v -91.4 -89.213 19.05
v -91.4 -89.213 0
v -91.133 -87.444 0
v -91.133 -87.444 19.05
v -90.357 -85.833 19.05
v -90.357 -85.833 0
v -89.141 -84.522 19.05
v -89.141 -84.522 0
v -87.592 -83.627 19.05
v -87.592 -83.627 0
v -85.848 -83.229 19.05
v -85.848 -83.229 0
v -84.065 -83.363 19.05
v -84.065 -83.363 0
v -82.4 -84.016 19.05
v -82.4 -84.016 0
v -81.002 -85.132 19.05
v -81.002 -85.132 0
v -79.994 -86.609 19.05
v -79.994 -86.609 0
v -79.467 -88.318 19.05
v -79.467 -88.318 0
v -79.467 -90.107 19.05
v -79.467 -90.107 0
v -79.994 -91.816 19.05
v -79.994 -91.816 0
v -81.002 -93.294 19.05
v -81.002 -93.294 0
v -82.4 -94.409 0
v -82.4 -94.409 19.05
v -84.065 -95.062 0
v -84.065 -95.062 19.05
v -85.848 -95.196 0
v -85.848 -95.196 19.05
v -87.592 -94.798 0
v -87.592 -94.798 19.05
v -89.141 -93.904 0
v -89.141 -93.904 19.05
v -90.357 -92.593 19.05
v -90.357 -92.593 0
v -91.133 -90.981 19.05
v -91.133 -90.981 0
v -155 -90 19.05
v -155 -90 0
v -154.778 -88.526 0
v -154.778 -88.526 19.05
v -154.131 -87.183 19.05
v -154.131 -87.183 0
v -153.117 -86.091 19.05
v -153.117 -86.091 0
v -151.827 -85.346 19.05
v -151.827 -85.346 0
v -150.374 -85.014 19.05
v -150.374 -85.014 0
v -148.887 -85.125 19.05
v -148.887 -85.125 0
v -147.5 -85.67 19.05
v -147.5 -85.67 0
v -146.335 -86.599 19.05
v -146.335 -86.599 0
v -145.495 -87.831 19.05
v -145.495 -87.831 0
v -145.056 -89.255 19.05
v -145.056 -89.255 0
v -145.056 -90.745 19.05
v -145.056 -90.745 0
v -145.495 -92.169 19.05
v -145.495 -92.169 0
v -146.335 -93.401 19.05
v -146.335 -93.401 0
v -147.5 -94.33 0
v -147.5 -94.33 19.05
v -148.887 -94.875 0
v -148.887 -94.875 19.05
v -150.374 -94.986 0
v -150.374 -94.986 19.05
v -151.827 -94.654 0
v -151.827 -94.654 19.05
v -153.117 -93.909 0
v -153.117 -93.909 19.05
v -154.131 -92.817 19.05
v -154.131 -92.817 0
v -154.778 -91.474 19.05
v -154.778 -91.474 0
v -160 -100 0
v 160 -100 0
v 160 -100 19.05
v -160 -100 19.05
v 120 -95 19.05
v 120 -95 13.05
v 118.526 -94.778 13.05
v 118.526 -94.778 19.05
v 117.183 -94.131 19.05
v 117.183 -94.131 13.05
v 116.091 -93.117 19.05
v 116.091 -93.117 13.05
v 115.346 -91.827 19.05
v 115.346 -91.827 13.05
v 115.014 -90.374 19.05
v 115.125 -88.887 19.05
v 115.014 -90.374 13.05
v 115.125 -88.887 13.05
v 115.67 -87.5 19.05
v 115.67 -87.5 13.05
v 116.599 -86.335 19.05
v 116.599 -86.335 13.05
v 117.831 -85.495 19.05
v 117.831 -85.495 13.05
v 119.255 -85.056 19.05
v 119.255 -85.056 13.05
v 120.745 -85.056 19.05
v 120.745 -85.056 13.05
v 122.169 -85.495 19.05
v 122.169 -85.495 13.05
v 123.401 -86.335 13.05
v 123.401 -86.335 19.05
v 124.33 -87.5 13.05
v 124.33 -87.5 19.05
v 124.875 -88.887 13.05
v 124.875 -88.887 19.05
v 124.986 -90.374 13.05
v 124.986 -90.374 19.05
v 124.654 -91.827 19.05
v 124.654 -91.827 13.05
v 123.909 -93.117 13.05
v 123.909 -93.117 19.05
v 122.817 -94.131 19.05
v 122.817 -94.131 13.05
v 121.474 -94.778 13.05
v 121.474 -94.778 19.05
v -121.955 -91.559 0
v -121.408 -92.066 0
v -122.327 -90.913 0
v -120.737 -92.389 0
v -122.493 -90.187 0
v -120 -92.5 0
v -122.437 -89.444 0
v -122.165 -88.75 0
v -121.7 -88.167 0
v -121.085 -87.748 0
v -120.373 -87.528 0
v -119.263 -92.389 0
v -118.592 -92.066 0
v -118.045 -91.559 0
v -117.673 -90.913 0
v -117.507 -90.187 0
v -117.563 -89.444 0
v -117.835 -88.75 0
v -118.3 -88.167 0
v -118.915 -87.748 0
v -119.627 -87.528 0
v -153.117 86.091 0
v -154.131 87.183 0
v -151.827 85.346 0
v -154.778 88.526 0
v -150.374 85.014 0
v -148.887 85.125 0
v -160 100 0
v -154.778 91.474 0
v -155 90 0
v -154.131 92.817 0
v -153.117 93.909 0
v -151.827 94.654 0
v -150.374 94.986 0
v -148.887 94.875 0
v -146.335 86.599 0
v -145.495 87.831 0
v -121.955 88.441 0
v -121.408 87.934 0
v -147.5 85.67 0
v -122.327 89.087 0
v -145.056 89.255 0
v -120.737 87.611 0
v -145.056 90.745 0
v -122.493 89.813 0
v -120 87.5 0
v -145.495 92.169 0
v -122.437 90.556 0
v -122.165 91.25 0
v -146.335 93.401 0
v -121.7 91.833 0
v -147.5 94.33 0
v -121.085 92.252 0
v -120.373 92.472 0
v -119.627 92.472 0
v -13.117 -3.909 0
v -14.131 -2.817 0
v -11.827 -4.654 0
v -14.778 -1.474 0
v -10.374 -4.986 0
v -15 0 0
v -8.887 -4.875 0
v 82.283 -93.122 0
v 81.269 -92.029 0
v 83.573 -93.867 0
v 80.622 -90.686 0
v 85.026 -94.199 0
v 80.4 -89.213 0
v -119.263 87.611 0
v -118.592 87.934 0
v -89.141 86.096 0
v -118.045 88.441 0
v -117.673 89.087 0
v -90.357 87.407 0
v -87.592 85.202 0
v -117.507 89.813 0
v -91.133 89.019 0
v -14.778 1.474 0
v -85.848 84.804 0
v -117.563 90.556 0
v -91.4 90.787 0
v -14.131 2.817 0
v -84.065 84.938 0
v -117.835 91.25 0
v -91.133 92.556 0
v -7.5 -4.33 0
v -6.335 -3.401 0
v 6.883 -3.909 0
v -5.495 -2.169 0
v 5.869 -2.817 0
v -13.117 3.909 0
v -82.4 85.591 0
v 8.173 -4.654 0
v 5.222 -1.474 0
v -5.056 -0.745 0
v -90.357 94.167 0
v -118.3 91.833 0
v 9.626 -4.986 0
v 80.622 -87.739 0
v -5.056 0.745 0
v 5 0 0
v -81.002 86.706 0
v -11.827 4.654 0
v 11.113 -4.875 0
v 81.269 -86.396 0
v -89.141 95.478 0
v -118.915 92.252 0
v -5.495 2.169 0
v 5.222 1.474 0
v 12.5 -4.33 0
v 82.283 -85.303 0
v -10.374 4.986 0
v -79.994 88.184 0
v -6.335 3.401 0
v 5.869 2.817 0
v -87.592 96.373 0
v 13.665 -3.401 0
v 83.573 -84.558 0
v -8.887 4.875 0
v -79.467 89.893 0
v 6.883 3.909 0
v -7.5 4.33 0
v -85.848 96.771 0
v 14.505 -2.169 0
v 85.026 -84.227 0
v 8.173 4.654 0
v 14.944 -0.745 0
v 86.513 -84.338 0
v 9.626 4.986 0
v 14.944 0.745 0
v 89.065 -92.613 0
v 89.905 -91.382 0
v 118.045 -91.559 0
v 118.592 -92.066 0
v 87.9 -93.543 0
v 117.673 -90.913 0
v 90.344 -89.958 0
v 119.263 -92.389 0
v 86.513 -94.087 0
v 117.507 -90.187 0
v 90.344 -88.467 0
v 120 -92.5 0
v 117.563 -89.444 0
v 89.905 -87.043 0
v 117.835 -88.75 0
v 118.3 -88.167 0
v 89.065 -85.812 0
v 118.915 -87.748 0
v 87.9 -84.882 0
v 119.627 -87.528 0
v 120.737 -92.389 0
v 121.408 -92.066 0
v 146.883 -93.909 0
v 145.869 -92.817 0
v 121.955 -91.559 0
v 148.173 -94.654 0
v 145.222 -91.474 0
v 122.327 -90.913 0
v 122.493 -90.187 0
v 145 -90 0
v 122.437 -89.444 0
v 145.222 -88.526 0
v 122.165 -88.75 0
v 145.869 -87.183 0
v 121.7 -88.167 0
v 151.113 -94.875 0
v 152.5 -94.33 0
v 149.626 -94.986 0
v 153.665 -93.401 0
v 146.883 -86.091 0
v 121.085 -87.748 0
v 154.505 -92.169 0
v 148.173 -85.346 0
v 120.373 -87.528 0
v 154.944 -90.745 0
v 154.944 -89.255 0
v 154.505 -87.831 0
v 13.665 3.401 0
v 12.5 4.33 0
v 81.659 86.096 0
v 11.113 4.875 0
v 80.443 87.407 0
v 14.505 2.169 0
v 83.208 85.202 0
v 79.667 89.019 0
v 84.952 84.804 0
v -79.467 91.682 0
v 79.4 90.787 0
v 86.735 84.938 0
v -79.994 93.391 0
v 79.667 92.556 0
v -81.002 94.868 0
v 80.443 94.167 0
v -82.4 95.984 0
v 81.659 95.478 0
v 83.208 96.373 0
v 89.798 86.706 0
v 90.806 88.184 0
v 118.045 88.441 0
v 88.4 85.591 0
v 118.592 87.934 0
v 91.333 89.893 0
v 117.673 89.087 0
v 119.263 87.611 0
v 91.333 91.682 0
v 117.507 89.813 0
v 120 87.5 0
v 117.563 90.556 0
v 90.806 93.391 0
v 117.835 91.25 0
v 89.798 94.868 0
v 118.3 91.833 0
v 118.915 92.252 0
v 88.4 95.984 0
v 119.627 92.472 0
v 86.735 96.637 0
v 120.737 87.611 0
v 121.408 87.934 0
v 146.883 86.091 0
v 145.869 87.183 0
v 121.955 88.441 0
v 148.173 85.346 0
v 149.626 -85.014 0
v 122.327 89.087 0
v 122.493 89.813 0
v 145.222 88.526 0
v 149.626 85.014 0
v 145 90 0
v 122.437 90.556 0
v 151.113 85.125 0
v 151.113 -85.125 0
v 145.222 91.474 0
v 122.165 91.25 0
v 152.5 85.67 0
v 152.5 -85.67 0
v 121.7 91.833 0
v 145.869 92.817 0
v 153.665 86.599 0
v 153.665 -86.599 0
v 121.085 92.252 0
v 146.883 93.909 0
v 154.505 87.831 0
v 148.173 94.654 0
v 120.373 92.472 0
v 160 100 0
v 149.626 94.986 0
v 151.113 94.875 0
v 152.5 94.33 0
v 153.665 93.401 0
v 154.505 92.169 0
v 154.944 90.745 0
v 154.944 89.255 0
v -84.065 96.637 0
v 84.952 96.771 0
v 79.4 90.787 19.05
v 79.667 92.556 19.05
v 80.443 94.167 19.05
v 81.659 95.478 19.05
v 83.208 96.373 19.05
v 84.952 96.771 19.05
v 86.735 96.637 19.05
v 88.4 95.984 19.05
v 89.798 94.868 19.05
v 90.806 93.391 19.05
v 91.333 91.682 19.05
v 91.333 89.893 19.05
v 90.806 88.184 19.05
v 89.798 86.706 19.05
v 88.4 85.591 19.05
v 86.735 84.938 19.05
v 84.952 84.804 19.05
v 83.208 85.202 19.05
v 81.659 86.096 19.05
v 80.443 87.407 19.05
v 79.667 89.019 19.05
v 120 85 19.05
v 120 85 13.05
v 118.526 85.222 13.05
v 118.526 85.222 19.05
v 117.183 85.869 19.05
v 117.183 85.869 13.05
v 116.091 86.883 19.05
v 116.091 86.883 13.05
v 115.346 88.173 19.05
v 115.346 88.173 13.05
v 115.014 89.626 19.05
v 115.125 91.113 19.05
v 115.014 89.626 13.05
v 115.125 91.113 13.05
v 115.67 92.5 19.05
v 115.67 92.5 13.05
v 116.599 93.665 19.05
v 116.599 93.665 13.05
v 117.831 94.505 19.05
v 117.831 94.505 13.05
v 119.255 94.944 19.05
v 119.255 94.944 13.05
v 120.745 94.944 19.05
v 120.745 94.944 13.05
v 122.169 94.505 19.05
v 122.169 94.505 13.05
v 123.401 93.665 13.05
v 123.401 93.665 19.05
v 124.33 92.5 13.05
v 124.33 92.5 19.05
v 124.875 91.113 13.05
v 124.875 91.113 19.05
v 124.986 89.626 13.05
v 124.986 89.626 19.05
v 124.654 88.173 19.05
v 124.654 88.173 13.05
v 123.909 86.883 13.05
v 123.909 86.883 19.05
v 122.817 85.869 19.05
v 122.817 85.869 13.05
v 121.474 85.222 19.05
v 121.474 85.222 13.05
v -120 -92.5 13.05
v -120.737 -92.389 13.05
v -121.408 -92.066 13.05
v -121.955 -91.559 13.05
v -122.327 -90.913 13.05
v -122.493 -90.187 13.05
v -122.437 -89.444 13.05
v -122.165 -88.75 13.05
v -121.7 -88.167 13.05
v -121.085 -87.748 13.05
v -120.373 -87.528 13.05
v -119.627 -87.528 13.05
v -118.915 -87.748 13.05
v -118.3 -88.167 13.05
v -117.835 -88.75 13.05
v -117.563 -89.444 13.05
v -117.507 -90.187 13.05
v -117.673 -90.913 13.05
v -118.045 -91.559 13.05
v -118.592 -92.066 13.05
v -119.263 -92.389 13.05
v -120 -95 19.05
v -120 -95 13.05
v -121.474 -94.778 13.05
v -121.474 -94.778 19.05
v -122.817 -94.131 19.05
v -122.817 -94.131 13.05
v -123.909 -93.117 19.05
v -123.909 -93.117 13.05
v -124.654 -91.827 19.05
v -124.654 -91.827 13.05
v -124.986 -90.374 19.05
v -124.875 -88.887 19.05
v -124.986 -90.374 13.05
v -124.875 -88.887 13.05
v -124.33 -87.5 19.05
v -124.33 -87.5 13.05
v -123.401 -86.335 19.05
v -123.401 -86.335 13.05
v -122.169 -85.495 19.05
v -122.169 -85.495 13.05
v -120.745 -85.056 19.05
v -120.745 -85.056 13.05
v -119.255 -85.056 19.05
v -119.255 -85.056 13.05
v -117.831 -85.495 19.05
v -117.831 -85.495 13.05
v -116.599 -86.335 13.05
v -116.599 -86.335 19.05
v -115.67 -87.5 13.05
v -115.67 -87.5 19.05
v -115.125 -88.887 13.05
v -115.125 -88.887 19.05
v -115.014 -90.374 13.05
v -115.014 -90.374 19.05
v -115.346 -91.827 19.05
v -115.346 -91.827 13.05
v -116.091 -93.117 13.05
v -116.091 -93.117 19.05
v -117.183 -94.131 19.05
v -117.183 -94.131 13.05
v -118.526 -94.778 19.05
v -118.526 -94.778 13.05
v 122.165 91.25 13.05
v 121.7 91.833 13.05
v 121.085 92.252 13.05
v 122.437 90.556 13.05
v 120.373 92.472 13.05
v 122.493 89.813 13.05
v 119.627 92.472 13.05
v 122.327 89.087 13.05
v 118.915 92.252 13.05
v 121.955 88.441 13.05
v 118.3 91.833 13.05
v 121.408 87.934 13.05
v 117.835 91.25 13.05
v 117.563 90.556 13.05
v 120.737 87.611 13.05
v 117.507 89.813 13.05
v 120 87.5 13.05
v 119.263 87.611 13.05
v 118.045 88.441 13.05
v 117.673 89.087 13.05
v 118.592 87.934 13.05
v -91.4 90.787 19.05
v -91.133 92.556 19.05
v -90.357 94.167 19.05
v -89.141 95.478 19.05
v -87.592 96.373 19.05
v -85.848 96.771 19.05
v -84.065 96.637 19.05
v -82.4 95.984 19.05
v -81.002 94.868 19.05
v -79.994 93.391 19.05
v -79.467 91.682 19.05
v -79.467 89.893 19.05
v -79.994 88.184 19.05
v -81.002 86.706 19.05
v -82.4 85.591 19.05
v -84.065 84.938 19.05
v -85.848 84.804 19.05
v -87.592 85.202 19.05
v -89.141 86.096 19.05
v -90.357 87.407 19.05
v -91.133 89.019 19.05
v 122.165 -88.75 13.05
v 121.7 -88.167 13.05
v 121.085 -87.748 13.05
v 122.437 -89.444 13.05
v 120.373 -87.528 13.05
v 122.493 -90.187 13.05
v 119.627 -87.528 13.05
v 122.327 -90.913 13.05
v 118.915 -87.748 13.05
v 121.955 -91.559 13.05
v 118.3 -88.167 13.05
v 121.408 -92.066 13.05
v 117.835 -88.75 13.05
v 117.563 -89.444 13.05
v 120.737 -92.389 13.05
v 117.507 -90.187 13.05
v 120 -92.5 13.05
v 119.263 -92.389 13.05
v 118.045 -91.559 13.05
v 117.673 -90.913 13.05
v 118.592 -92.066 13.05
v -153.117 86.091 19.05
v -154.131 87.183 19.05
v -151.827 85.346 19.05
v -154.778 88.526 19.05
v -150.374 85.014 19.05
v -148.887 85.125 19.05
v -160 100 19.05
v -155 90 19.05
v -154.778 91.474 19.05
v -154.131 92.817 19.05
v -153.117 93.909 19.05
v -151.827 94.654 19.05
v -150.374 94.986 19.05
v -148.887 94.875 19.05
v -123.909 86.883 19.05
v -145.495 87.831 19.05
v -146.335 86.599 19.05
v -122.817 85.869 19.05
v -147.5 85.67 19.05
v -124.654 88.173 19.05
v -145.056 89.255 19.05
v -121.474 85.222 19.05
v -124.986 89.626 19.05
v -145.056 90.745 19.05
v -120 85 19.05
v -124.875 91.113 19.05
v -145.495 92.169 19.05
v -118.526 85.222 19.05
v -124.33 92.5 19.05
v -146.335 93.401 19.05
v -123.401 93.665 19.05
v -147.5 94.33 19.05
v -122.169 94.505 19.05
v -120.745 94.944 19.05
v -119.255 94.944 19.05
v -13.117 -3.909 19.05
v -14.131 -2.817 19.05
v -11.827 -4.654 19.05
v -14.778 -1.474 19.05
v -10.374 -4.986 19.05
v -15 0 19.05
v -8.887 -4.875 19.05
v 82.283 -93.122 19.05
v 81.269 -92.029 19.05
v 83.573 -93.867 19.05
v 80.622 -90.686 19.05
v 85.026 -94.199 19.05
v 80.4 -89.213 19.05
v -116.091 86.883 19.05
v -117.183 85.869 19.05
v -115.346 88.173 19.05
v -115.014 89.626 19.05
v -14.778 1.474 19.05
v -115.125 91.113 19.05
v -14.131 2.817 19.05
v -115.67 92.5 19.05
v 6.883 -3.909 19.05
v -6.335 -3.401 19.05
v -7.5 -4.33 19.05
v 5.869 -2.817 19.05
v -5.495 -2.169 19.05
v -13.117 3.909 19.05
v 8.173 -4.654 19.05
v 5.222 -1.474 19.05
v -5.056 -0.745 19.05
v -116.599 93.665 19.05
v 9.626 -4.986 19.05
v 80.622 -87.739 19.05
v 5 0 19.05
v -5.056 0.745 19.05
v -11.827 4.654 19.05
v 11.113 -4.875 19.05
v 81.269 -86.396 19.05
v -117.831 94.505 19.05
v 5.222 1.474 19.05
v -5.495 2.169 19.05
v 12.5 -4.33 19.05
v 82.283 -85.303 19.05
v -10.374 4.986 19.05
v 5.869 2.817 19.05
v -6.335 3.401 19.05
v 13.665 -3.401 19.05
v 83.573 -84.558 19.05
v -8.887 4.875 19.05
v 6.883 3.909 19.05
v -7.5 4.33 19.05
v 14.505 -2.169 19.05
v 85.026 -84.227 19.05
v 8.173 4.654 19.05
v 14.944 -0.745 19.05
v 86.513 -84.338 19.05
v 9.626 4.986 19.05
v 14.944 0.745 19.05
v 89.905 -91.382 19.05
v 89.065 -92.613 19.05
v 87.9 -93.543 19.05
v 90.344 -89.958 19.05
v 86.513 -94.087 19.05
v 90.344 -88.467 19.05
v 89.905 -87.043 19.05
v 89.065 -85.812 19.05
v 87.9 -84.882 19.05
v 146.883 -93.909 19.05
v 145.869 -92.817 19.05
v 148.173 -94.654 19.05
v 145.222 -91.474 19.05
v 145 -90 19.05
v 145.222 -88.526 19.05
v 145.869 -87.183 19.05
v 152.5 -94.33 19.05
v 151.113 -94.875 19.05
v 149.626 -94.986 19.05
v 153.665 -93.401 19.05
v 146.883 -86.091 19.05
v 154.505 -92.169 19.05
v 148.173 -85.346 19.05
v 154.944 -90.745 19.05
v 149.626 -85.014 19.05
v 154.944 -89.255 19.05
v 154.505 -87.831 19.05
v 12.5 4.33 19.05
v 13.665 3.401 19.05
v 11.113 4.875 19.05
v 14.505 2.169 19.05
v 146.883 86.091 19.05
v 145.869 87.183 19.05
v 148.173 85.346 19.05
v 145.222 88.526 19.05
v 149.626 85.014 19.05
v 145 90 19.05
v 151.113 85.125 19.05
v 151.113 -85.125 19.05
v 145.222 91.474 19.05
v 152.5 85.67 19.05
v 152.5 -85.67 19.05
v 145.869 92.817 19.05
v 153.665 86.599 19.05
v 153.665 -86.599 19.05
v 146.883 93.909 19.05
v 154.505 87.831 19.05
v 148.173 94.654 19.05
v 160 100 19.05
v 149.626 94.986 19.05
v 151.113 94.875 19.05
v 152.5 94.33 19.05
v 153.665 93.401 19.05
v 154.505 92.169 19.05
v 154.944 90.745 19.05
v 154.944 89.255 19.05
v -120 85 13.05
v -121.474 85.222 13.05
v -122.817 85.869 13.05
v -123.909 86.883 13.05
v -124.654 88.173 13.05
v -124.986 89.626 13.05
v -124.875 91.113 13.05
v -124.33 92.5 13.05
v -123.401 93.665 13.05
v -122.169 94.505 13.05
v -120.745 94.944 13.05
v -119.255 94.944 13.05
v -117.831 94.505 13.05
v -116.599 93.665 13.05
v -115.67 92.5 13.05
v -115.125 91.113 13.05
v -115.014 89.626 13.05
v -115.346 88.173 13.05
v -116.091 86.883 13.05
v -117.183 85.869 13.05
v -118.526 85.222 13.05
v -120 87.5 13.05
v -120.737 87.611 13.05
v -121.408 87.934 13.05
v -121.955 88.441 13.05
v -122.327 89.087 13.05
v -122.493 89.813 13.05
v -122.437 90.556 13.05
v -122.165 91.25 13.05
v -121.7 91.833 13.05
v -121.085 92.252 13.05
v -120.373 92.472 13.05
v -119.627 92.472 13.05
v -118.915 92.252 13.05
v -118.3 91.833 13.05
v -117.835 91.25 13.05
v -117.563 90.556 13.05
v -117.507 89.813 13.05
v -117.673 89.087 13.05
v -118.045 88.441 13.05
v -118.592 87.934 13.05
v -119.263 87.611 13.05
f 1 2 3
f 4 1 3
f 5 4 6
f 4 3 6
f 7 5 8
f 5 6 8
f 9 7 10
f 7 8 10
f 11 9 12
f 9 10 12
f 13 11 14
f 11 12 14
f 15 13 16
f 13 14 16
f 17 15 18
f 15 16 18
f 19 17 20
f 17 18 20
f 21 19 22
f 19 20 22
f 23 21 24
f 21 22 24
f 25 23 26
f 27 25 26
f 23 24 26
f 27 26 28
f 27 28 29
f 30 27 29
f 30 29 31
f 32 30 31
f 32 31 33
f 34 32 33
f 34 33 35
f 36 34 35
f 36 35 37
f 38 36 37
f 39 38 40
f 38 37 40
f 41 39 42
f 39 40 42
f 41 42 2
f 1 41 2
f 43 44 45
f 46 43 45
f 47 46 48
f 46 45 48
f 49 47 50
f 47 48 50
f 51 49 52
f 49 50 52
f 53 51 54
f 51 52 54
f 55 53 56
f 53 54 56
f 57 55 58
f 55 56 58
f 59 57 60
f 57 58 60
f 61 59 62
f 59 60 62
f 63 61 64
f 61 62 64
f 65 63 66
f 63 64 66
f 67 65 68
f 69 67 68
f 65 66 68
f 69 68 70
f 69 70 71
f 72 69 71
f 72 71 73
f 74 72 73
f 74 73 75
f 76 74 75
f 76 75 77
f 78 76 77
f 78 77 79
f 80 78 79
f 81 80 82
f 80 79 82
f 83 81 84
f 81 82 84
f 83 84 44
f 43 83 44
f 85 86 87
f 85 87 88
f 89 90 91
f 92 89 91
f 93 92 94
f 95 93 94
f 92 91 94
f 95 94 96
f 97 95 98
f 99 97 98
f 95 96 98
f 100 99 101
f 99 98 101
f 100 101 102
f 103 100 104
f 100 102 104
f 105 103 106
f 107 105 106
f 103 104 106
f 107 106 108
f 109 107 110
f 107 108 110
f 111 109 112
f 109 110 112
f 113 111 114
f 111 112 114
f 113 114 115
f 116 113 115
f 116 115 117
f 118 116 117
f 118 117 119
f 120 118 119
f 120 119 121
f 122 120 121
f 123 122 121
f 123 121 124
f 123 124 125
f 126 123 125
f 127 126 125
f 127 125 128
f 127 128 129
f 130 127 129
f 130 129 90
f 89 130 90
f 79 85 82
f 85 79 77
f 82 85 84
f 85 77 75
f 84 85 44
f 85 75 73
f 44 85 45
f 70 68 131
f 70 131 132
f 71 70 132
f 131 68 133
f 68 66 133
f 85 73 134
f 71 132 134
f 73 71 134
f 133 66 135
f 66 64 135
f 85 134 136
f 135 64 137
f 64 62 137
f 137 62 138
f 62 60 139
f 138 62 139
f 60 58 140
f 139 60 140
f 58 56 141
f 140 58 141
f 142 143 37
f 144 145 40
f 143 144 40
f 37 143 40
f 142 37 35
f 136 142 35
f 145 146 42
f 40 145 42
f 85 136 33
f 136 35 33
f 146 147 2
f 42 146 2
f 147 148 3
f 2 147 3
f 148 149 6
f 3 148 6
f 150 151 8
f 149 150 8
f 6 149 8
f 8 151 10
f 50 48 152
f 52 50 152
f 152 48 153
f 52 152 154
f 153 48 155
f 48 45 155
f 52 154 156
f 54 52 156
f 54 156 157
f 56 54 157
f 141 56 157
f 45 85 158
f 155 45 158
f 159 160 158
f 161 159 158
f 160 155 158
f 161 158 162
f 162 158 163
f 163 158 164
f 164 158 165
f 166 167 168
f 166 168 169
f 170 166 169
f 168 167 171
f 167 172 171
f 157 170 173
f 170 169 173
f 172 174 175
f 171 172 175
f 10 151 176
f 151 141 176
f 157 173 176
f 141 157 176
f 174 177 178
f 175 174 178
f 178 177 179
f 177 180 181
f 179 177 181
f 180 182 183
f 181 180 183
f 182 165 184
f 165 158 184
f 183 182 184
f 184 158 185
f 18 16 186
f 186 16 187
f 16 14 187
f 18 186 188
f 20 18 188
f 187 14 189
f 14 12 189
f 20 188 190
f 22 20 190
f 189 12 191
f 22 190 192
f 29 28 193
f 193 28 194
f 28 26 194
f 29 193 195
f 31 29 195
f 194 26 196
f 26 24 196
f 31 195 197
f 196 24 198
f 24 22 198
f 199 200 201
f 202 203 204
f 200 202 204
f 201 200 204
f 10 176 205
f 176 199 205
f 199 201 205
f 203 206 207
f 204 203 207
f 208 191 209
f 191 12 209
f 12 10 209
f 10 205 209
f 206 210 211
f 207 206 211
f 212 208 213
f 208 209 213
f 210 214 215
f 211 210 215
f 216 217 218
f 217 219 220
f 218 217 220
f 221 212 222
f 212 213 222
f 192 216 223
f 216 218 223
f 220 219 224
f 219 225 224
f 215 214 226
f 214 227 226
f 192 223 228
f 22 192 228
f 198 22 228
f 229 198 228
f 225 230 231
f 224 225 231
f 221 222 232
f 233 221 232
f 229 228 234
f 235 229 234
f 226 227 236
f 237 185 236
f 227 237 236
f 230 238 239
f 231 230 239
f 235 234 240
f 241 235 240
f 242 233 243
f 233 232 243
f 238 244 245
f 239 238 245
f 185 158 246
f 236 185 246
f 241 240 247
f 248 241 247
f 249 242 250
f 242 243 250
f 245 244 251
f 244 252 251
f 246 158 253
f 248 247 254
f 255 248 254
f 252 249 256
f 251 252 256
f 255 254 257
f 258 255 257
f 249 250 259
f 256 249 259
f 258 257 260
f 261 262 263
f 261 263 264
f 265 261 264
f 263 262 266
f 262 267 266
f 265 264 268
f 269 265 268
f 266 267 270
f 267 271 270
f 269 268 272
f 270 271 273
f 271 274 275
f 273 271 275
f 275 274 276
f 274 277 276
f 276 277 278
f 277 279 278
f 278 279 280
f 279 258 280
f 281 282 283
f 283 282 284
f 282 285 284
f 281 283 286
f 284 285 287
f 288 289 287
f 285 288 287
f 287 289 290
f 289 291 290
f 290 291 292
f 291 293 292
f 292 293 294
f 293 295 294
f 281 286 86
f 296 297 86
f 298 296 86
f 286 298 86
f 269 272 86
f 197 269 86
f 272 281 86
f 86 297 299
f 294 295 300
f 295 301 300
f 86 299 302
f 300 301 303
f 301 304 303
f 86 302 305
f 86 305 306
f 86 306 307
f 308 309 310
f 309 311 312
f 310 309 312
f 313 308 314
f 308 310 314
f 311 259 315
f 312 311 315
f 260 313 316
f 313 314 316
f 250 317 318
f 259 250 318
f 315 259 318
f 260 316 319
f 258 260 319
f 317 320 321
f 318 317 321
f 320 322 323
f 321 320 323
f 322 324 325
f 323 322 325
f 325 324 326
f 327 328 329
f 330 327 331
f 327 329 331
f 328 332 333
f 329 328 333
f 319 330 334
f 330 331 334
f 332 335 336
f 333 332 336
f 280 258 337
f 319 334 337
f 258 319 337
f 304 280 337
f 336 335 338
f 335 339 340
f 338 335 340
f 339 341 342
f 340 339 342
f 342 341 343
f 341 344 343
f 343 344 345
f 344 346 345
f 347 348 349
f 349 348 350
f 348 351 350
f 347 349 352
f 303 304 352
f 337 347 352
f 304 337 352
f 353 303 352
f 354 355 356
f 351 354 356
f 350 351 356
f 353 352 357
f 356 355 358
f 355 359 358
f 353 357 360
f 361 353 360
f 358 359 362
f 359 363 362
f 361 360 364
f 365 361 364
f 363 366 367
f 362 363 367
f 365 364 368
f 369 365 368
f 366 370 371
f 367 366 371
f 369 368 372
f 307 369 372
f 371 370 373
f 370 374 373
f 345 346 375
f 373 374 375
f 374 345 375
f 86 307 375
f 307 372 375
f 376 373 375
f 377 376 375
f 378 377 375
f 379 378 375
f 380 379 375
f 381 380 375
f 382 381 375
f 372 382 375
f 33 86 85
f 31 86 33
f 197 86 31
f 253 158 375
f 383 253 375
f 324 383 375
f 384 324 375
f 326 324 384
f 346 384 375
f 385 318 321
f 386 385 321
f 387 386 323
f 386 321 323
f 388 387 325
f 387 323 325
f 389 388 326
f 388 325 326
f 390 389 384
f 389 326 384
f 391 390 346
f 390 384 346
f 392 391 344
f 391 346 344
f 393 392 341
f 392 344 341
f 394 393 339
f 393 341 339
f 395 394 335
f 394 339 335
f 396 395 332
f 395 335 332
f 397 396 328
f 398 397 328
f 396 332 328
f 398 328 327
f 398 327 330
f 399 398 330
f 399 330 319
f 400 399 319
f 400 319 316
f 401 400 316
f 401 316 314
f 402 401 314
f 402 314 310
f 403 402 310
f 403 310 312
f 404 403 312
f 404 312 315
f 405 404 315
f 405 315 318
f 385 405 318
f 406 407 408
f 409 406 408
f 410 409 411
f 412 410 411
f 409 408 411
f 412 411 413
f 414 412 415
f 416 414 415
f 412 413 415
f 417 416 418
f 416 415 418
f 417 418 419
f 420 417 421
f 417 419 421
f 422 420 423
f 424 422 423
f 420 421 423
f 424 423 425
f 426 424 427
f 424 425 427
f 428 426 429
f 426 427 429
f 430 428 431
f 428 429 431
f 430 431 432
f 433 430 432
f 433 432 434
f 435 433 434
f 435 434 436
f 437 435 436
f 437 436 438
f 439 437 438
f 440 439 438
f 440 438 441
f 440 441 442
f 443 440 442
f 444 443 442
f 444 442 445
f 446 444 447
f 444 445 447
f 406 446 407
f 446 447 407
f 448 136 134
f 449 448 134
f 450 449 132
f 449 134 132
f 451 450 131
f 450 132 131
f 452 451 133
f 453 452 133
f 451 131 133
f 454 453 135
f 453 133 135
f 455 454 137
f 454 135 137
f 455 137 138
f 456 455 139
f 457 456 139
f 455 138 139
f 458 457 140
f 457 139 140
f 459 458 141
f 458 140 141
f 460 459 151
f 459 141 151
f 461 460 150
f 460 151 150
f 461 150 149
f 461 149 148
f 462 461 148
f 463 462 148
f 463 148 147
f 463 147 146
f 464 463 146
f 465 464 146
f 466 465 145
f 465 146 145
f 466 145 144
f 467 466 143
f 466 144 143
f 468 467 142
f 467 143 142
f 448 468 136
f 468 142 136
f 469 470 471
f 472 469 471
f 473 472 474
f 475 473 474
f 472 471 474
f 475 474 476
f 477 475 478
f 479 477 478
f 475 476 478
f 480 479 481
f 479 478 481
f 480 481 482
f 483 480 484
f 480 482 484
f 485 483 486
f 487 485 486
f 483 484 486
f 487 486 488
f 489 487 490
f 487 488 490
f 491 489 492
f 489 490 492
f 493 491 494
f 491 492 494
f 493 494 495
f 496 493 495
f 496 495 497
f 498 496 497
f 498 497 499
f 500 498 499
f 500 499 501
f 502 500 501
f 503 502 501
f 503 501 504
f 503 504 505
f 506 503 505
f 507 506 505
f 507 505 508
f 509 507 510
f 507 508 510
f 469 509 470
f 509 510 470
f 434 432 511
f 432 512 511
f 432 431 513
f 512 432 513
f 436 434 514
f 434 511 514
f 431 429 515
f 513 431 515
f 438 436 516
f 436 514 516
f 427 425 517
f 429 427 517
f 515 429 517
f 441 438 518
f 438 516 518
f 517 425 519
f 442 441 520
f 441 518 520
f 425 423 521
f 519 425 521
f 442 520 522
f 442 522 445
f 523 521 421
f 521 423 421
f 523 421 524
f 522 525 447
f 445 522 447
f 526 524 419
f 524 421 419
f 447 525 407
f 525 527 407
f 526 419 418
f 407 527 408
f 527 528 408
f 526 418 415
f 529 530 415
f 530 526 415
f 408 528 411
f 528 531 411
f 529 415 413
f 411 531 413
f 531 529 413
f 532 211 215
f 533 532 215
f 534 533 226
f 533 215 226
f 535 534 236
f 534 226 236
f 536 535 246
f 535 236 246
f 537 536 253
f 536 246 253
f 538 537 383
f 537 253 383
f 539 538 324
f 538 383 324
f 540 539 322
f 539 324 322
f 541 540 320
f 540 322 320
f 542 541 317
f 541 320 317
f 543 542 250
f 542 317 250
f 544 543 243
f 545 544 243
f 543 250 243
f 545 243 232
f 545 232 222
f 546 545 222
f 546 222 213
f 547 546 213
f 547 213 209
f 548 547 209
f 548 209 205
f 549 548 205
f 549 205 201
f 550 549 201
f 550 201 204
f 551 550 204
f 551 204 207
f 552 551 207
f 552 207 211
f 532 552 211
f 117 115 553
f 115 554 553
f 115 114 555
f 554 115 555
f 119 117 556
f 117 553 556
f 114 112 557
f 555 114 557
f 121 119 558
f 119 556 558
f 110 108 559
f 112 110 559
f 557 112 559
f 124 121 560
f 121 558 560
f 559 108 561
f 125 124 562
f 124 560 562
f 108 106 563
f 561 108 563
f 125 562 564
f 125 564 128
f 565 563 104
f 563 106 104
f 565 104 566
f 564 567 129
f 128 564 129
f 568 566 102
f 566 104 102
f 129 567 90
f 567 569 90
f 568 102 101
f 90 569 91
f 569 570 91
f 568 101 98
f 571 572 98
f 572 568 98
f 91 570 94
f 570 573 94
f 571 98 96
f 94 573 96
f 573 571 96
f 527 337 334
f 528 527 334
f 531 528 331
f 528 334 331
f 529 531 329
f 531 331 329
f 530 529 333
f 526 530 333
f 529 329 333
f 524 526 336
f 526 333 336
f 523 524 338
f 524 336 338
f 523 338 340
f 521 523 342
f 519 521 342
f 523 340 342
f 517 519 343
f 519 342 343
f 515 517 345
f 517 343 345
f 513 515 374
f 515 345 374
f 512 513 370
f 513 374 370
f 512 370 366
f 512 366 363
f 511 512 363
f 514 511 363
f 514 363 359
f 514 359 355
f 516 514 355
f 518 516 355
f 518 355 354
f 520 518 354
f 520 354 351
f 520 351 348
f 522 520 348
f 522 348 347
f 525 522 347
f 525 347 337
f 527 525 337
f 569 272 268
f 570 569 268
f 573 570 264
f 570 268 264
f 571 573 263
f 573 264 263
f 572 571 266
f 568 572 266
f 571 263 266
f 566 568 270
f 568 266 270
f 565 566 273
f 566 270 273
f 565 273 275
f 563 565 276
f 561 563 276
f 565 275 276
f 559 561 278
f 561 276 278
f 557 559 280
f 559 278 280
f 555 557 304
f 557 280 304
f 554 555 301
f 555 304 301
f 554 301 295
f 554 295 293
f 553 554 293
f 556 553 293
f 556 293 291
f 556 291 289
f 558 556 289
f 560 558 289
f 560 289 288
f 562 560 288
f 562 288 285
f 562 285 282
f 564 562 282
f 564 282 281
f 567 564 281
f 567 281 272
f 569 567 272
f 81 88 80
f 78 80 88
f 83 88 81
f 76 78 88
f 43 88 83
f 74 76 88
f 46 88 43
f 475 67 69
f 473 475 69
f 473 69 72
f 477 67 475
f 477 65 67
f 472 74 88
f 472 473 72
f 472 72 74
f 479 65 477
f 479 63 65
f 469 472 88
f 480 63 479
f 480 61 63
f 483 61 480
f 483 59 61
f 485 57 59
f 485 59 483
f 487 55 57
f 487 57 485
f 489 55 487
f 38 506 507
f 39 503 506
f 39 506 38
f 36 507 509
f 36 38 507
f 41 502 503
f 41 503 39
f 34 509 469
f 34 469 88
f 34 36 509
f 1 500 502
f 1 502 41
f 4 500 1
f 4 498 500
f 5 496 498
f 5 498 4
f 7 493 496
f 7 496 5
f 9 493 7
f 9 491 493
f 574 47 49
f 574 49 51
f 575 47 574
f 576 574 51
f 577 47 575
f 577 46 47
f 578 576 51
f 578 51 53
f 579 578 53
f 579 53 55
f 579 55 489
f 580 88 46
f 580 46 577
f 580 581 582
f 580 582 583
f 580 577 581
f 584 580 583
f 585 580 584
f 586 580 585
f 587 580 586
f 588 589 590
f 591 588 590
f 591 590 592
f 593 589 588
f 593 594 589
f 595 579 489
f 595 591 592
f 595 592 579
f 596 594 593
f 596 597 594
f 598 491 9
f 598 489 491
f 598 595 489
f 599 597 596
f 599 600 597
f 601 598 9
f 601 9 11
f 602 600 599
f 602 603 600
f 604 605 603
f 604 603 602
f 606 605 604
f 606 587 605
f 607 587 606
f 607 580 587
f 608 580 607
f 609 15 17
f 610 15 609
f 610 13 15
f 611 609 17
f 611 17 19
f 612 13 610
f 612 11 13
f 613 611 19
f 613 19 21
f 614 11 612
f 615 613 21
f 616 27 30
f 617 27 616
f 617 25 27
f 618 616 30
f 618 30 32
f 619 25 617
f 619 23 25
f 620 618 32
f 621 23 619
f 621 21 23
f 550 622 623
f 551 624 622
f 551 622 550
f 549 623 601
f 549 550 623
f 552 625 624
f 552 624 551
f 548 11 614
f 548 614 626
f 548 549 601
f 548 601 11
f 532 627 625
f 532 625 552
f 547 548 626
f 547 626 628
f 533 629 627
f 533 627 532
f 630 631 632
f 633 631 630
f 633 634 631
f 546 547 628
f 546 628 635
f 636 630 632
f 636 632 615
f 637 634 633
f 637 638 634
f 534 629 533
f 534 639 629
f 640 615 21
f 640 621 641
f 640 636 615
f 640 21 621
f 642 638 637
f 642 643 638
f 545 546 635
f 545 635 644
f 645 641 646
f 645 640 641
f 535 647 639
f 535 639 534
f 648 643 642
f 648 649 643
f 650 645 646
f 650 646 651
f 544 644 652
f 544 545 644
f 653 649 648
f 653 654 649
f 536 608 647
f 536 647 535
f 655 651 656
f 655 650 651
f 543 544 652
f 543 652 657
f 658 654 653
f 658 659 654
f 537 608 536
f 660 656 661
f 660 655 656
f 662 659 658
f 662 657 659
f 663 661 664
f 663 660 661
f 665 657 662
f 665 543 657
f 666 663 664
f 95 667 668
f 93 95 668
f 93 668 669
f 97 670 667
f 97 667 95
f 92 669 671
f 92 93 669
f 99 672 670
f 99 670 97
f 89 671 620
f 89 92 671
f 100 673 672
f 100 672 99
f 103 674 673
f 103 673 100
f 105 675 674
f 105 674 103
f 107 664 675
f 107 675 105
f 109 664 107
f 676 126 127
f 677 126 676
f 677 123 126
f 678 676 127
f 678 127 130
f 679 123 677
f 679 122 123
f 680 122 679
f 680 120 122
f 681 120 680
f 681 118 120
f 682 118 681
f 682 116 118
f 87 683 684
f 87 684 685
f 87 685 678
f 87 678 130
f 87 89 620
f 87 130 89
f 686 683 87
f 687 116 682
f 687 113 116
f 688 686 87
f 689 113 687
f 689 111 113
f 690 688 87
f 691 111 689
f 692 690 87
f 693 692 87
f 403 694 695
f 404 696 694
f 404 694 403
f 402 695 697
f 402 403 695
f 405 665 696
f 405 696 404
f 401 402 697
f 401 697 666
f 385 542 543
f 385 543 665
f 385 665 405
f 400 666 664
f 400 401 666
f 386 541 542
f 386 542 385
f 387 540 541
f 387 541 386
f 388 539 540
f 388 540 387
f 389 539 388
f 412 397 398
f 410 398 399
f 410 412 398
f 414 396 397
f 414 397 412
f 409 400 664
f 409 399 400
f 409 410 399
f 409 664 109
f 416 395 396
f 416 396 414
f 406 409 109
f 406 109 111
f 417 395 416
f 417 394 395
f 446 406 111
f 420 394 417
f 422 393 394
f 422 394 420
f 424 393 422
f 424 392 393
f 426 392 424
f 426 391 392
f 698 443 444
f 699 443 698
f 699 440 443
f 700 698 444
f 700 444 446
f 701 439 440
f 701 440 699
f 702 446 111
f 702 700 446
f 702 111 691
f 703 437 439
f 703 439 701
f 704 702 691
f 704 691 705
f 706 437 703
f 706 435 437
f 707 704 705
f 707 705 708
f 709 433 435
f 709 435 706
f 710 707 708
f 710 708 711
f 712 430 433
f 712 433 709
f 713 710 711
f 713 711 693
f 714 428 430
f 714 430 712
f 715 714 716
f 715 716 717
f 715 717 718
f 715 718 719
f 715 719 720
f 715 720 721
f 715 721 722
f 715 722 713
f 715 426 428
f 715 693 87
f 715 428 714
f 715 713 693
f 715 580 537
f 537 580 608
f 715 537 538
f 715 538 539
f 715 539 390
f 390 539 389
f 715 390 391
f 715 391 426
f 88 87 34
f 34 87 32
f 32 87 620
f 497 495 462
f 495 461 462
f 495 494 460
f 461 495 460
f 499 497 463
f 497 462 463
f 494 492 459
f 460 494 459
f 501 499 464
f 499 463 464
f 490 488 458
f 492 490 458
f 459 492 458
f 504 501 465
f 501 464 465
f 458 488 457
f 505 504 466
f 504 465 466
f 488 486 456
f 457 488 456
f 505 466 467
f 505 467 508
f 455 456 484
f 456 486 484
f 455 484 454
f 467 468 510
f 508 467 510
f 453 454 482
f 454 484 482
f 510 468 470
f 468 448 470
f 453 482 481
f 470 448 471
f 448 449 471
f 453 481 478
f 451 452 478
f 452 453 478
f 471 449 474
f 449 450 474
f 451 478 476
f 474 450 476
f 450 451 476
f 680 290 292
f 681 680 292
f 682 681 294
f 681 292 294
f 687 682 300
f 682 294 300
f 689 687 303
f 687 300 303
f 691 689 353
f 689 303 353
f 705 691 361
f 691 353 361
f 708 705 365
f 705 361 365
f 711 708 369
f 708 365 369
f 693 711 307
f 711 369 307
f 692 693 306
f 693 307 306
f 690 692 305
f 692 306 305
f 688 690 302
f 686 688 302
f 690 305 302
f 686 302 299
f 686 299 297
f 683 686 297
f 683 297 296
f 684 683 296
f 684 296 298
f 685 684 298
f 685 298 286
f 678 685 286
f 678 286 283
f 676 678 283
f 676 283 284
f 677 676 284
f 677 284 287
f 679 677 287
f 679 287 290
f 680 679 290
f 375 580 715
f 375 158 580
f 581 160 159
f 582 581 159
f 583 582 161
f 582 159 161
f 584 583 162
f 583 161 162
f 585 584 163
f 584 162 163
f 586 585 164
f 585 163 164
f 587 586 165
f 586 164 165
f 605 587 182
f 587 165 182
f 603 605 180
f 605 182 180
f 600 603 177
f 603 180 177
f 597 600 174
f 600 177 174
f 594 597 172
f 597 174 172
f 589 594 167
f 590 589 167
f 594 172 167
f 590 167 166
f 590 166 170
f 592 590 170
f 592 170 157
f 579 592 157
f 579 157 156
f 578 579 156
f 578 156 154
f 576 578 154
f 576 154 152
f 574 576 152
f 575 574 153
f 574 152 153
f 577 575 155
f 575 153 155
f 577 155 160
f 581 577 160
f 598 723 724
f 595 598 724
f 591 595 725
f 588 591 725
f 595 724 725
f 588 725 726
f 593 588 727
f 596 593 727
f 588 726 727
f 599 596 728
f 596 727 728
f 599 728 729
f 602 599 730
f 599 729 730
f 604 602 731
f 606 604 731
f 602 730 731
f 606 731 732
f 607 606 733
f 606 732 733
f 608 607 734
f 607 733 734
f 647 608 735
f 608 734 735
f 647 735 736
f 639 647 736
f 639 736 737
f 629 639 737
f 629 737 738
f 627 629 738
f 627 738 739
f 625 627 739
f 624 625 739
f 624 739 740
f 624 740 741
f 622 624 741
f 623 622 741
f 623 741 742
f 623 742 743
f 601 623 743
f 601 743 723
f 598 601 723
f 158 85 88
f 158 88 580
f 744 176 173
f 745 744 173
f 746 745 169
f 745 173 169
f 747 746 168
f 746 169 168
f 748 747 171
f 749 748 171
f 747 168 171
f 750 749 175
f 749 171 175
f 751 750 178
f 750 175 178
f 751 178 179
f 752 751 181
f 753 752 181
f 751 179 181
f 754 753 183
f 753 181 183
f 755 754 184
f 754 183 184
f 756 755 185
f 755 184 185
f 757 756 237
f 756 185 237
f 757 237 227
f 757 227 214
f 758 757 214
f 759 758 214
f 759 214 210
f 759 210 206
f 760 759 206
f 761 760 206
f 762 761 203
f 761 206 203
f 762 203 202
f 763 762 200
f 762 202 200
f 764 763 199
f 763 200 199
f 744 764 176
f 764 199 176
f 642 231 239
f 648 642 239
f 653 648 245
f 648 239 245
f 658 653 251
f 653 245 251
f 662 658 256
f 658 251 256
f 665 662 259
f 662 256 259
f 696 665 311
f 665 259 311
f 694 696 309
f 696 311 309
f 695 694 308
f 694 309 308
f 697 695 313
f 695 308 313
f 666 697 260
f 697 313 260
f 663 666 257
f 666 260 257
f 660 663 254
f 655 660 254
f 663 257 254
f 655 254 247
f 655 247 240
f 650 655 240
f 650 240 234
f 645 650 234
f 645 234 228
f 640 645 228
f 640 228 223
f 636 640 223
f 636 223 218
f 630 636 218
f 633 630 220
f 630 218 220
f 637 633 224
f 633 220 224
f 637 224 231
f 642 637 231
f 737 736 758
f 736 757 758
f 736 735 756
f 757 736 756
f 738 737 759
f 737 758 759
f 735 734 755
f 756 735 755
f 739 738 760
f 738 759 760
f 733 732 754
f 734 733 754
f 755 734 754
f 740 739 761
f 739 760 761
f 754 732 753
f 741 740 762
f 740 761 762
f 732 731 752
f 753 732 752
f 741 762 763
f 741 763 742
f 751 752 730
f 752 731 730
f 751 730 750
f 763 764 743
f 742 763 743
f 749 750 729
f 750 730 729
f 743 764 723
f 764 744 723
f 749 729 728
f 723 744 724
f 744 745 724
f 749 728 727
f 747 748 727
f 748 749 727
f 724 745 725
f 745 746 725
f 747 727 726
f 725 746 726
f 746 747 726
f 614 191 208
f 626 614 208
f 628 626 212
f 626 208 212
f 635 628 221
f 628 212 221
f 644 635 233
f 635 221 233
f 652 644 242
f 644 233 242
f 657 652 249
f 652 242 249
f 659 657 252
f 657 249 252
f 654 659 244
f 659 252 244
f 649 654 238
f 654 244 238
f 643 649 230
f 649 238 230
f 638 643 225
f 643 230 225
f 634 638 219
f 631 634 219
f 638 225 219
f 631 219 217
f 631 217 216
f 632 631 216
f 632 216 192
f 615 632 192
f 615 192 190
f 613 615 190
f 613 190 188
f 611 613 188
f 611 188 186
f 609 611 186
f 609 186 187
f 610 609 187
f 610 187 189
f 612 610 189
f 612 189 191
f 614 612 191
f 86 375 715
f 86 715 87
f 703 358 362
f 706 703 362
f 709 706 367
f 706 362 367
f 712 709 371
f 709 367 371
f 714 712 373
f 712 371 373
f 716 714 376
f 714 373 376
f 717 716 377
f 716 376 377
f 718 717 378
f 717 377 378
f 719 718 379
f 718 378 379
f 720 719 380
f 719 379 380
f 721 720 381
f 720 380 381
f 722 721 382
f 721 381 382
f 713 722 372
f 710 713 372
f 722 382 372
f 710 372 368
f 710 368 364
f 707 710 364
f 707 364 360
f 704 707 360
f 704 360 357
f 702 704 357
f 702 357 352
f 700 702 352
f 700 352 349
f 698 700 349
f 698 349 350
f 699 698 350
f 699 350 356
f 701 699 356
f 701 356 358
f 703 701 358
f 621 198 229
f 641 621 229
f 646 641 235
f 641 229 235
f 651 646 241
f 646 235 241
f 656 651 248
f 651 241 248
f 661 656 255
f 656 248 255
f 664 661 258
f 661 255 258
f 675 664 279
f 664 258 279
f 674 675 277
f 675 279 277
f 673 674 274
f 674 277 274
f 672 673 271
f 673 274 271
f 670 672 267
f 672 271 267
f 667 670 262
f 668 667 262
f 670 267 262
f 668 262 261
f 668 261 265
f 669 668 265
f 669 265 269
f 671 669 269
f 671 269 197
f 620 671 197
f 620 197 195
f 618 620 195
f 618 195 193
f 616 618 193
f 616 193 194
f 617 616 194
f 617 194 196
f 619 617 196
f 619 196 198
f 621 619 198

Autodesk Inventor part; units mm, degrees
ref_plane "YZ Plane" through (0, 0, 0) normal (1, 0, 0) x (0, 1, 0)
ref_plane "XZ Plane" through (0, 0, 0) normal (0, 1, 0) x (-1, 0, 0)
ref_plane "XY Plane" through (0, 0, 0) normal (0, 0, 1) x (1, 0, 0)
sketch "Sketch1" plane through (0, 0, 0) normal (0, 0, 1) x (1, 0, 0)
  line L0 (-160, 100) -> (160, 100)
  line L1 (160, 100) -> (160, -100)
  line L2 (160, -100) -> (-160, -100)
  line L3 (-160, -100) -> (-160, 100)
  point P0 (0, 0)
  dimension "d0" = 320
  dimension "d1" = 200
  dimension "d2" = 160
  dimension "d3" = 100
extrude "Extrusion1" add sketch "Sketch1" along normal blind 19.05
sketch "Sketch2" plane through (0, 0, 0) normal (0, 0, -1) x (-1, 0, 0)
  circle A0 centre (150, 90) radius 2.5 projected
  circle A1 centre (85.4, 90.7874) radius 2.0701 projected
  circle A2 centre (85.4, -89.2126) radius 2.5 projected
  circle A3 centre (150, -90) radius 2.5 projected
  circle A4 centre (10, 0) radius 2.067 projected
  circle A5 centre (-10, 0) radius 2.067 projected
  circle A6 centre (-85.4, -89.2126) radius 2.0701 projected
  circle A7 centre (-150, -90) radius 2.5 projected
  circle A8 centre (-85.4, 90.7874) radius 2.0701 projected
  circle A9 centre (-150, 90) radius 2.5 projected
  circle A10 centre (-150, -90) radius 5
  circle A11 centre (-85.4, -89.2126) radius 5
  circle A12 centre (-150, 90) radius 5
  circle A13 centre (-85.4, 90.7874) radius 6
  circle A14 centre (-10, 0) radius 5
  circle A15 centre (10, 0) radius 5
  circle A16 centre (85.4, 90.7874) radius 6
  circle A17 centre (150, 90) radius 5
  circle A18 centre (85.4, -89.2126) radius 6
  circle A19 centre (150, -90) radius 5
  point P0 (0, 0)
  dimension "d6" = 10
  dimension "d7" = 10
  dimension "d8" = 10
  dimension "d9" = 12
  dimension "d10" = 10
  dimension "d11" = 10
  dimension "d12" = 12
  dimension "d13" = 10
  dimension "d14" = 12
  dimension "d15" = 10
extrude "Extrusion2" cut sketch "Sketch2" against normal through all contours A0 | A1 | A2 | A3 | A4 | A5 | A6 | A7 | A8 | A9 | A10 | A11 | A12 | A13 | A14 | A15 | A16 | A17 | A18 | A19
sketch "Sketch5" plane through (0, 0, 19.05) normal (0, 0, 1) x (1, 0, 0)
  circle A0 centre (-120, 90) radius 2.75 projected
  circle A1 centre (-120, -90) radius 2.75 projected
  circle A2 centre (120, -90) radius 2.75 projected
  circle A3 centre (120, 90) radius 2.75 projected
  point P0 (0, 0)
hole "Hole1" at (-120, 90, 19.05) at (-120, -90, 19.05) at (120, -90, 19.05) at (120, 90, 19.05) direction (0, 0, -1) diameter 5 end through all counterbore diameter 10 counterbore depth 6
equation "\"d2\" = 0.5 * d0"
equation "\"d3\" = 0.5 * d1"
properties part number "wasteboard" material "Wood"
